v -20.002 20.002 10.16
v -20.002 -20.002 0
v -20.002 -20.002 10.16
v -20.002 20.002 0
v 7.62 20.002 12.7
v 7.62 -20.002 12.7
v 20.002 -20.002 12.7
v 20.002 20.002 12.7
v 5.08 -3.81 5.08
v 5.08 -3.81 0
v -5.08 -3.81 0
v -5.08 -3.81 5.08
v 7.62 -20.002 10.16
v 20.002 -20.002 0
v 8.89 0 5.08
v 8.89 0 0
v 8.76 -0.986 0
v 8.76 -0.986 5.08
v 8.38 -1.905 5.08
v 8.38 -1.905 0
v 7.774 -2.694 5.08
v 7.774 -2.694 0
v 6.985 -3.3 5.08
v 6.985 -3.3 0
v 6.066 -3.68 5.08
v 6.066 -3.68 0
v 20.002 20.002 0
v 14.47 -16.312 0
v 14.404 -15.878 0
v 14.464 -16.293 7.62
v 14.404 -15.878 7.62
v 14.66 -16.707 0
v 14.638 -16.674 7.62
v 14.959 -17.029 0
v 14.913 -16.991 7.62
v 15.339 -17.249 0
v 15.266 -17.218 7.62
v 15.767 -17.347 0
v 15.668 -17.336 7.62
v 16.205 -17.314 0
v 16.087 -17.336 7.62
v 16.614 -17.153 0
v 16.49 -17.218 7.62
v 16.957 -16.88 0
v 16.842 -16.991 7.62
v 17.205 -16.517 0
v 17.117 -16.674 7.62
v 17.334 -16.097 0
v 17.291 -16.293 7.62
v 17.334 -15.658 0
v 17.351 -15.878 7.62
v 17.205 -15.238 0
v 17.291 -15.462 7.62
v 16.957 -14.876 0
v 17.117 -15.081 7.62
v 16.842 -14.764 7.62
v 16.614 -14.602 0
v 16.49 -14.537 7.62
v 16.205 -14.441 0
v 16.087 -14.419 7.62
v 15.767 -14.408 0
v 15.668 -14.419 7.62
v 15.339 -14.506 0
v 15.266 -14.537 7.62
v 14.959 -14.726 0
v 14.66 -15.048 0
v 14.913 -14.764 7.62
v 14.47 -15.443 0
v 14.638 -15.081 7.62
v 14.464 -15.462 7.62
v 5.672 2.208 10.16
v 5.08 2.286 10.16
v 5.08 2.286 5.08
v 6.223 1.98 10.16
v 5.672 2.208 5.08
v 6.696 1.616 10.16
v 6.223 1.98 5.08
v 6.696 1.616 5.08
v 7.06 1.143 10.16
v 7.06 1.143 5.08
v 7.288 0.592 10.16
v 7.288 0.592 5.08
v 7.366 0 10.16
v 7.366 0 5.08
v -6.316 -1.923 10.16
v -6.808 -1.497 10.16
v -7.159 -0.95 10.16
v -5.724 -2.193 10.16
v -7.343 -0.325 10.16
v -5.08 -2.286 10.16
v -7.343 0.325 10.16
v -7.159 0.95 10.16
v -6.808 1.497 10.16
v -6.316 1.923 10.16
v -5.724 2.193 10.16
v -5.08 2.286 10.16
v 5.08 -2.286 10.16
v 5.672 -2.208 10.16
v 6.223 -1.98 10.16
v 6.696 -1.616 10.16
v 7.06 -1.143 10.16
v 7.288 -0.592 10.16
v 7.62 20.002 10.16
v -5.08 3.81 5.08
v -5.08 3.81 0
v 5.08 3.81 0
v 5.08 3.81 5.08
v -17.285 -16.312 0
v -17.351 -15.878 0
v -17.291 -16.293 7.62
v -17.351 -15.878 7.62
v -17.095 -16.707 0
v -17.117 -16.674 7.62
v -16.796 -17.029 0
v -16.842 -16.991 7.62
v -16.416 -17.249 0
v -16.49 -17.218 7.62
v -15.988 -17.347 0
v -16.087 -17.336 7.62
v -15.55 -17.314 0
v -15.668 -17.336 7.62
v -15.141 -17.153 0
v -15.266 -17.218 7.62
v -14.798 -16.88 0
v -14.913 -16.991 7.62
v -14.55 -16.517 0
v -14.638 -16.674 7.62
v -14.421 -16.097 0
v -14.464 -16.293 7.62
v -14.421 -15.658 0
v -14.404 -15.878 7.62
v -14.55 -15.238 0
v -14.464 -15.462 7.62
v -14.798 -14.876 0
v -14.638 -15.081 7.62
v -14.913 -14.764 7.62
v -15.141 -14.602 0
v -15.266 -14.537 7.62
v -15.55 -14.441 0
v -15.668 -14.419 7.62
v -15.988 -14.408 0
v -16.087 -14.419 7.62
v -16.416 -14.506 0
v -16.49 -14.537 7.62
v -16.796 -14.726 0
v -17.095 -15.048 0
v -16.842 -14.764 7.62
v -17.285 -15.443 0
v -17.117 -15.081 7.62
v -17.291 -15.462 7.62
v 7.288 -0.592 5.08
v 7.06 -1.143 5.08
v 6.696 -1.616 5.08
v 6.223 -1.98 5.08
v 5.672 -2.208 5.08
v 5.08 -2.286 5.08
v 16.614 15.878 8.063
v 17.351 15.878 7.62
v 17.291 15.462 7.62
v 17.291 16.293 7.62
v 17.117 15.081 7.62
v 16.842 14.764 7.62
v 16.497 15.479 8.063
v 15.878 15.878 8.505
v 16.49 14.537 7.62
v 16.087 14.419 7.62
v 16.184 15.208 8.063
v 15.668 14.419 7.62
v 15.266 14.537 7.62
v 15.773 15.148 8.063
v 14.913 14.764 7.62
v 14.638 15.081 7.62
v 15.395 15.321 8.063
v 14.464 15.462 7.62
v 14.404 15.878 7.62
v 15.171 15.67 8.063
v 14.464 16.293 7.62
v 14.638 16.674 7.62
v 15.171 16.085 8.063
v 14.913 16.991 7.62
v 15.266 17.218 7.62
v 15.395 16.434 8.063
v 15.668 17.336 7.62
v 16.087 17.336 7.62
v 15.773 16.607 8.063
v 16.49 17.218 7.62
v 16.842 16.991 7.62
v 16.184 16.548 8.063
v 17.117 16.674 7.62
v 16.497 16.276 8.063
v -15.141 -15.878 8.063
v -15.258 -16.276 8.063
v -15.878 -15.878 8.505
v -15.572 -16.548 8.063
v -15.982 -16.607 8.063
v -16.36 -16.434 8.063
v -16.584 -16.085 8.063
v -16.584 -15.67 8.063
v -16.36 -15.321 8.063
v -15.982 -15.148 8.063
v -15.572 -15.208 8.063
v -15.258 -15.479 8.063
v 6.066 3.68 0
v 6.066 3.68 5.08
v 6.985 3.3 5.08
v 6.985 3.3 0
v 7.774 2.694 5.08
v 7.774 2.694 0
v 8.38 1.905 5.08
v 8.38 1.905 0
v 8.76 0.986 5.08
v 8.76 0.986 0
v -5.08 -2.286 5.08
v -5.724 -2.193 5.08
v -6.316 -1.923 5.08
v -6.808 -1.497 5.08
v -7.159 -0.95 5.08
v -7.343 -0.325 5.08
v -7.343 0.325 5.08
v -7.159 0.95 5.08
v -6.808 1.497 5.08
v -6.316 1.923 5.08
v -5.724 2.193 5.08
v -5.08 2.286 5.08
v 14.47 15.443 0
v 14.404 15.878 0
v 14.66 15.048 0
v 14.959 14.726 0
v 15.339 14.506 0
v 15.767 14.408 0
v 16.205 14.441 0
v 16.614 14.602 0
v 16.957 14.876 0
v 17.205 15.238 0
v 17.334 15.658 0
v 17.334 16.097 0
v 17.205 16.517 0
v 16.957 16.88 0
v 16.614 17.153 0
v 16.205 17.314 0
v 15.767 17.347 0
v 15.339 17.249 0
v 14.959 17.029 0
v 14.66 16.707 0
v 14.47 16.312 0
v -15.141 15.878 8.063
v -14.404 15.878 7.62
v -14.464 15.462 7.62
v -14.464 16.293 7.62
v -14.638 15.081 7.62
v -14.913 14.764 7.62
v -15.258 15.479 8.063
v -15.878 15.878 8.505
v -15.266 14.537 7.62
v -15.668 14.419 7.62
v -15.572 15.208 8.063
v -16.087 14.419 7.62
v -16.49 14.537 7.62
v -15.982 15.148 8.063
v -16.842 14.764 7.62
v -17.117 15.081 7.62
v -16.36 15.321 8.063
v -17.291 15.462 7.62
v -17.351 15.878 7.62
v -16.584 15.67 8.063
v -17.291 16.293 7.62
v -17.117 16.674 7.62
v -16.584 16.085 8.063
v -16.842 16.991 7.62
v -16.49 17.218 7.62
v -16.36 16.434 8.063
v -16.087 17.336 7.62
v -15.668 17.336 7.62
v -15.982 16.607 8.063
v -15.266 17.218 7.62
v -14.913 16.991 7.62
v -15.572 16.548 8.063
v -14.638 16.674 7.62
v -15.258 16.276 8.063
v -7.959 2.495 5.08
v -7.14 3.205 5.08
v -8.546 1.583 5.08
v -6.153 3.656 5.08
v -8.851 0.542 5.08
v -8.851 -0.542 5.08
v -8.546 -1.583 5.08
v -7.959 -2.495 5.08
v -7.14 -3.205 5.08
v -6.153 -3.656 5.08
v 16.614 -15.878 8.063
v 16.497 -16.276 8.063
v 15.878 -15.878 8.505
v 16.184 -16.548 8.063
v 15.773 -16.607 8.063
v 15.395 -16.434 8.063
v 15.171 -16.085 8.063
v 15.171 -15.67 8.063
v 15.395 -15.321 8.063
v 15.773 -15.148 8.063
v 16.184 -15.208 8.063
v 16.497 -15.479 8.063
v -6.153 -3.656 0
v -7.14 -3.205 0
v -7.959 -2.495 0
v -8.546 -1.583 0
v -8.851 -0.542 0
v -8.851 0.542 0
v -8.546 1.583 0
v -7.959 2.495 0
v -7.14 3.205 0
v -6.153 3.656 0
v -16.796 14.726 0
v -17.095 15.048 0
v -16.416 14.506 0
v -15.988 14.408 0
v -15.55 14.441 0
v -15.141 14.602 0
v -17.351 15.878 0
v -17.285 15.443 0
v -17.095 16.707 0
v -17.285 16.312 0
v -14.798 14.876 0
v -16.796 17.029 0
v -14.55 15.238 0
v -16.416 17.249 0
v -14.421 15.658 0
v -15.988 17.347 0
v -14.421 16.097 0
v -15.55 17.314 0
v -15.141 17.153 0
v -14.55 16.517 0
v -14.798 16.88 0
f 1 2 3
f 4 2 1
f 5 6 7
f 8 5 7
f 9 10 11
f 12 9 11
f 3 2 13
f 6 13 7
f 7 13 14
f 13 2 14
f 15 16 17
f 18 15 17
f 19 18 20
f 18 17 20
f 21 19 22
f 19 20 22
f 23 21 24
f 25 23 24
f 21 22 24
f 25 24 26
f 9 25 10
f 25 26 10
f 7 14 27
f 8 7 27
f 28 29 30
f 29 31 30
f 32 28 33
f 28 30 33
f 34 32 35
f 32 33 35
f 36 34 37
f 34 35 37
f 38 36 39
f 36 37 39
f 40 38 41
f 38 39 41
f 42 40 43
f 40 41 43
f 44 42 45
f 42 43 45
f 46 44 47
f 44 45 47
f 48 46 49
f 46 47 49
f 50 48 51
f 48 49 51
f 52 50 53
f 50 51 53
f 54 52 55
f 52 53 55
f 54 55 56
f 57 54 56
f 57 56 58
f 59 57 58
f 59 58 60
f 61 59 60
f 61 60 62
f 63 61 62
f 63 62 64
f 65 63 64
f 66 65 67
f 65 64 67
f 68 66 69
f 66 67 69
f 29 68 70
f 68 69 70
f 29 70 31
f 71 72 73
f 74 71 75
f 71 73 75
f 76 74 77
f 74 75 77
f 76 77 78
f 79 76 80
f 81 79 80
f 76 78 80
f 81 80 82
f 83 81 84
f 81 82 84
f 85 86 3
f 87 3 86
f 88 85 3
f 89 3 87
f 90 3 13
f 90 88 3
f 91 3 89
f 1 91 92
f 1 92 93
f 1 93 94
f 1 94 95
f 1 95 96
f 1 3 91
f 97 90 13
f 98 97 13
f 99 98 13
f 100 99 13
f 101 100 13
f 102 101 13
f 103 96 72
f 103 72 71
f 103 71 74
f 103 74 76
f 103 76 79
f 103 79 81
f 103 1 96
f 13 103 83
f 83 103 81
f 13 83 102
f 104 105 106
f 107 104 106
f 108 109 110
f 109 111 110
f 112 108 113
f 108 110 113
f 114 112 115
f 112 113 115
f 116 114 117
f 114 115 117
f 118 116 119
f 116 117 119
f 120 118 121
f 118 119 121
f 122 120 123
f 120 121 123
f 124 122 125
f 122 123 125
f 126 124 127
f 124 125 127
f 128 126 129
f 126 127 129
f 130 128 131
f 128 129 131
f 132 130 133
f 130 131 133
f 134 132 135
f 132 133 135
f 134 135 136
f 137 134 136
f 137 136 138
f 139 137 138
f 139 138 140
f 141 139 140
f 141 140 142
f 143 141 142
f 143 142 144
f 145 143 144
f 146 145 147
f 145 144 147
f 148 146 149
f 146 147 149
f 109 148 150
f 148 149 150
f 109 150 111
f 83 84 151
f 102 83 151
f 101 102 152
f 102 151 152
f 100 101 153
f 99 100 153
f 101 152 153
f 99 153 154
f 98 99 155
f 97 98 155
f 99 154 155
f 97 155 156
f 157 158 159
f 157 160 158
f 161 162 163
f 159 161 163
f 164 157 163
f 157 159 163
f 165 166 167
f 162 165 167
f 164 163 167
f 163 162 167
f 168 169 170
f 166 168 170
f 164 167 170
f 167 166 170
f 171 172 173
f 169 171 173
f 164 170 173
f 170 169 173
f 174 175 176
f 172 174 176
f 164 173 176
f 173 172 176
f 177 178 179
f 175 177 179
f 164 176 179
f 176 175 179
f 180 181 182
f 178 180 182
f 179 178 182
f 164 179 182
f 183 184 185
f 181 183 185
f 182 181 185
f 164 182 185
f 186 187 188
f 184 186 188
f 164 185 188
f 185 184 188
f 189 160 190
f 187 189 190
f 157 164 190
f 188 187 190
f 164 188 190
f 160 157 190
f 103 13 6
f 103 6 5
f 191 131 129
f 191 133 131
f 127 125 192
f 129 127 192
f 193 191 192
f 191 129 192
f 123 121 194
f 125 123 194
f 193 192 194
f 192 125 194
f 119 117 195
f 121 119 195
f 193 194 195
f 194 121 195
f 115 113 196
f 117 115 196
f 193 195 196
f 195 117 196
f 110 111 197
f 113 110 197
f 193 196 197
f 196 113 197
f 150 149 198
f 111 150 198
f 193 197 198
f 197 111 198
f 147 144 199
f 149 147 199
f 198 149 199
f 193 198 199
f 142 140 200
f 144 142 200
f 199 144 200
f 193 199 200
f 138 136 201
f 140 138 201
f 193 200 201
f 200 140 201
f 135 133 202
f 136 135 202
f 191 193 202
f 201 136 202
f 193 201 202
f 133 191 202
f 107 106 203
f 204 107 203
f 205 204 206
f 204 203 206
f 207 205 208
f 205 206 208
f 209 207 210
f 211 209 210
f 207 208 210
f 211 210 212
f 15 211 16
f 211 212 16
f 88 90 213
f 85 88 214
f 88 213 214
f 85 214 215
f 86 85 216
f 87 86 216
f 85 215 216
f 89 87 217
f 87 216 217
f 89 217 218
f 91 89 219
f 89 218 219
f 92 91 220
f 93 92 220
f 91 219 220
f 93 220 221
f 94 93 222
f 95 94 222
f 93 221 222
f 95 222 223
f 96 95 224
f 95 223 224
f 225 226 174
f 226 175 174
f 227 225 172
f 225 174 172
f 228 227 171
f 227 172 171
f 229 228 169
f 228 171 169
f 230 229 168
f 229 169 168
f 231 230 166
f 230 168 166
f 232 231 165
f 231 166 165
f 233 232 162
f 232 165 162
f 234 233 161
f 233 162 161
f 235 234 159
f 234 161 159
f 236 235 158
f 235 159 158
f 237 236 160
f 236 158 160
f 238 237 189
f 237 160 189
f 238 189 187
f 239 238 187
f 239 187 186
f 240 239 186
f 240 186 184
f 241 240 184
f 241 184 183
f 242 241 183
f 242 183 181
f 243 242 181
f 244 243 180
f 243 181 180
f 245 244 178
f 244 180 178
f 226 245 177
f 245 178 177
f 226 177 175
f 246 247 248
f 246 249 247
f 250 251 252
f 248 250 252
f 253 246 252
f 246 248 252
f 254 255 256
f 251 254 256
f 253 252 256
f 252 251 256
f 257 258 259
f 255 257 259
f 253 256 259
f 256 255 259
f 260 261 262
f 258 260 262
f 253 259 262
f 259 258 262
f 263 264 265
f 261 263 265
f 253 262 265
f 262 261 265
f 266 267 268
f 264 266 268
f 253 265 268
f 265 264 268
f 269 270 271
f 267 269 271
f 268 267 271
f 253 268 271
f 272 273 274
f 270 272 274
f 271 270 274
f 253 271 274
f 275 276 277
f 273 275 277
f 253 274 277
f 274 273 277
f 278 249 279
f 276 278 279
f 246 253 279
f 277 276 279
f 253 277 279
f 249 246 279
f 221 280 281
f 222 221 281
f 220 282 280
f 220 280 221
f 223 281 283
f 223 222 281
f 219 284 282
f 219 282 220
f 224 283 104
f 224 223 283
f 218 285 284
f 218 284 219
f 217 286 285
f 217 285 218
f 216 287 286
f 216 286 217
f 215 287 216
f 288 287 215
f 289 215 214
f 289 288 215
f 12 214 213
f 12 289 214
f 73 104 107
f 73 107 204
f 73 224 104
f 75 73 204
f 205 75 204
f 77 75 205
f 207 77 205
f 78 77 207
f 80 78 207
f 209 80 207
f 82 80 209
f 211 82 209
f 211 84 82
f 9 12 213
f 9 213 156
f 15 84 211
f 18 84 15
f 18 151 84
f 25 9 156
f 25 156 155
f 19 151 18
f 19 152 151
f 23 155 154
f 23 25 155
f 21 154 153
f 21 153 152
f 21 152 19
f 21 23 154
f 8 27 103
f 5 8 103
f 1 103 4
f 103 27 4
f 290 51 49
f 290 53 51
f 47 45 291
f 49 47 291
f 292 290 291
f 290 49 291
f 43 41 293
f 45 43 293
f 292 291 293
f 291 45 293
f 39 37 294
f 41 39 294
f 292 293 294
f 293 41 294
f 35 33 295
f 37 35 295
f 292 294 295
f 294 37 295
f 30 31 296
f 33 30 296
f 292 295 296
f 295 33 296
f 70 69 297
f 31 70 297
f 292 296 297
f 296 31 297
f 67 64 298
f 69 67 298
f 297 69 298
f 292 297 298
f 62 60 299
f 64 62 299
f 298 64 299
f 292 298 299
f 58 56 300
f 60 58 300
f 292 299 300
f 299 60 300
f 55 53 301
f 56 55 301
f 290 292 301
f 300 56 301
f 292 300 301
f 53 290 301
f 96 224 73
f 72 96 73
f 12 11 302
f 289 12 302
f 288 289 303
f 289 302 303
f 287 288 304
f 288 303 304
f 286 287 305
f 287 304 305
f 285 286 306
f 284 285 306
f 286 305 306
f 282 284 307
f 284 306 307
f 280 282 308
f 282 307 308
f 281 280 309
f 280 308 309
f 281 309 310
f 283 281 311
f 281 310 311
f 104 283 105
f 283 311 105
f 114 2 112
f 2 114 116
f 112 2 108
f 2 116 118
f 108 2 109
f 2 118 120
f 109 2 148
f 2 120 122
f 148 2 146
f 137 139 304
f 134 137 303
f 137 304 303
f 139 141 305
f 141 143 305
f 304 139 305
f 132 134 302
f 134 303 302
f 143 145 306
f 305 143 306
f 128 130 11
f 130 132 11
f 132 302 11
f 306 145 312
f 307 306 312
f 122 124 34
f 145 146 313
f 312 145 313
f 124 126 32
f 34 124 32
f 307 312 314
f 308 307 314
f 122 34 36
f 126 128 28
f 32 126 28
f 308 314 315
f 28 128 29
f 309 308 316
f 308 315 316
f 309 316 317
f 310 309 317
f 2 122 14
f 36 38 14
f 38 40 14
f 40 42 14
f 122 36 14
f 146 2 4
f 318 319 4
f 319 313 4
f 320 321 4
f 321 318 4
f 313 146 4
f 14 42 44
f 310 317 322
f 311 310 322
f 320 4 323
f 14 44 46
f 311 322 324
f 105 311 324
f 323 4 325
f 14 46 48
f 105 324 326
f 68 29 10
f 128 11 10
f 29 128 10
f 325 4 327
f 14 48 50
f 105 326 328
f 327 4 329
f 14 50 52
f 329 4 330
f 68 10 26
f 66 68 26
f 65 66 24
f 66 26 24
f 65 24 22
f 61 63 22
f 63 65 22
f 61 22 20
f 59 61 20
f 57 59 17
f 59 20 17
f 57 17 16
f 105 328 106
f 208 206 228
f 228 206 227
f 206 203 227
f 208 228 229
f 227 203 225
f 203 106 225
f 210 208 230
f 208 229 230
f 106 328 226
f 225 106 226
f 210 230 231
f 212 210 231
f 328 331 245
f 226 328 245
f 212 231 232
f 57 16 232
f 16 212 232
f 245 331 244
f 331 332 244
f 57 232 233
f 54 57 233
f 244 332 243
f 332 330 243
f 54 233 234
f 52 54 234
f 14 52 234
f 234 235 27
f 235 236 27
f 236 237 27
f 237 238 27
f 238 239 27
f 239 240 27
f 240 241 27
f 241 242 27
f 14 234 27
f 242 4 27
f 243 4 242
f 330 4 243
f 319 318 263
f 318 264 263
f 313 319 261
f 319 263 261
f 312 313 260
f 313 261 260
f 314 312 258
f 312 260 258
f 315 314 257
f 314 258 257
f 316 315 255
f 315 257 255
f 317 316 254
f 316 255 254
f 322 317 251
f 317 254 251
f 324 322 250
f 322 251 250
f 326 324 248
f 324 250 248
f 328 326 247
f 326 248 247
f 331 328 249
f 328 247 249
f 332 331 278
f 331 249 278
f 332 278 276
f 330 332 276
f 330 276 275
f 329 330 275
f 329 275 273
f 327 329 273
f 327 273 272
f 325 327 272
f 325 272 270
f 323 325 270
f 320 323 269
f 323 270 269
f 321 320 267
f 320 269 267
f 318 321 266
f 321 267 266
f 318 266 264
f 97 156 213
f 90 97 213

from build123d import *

# Parameters (mm, degrees)
F0_W     = 27.6225
F0_H     = 40.005
F0_R     = 3.302
F0_W_2   = 12.3825
F0_R_2   = 2.159
F1_DEPTH = 10.16
F2_DEPTH = 12.7
F4_DEPTH = 25.4
F5_DEPTH = 5.08
F6_DEPTH = 12.7
F8_D     = 2.9464
F8_DEPTH = 7.62
F8_TIP   = 0.885187864


# Not quite as in the source:
# - a feature names something its author has since deleted; it is built from what else it names


with BuildPart() as f1:
    # F0 (on Top) → F1 (new body)
    with BuildSketch(Plane.XY):
        with Locations((-6.19125, 0)):
            Rectangle(F0_W, F0_H)
        with Locations((-15.875, -15.875)):
            Circle(F0_R, mode=Mode.SUBTRACT)
        with Locations((-15.875, 15.875)):
            Circle(F0_R, mode=Mode.SUBTRACT)
        with Locations((13.81125, 0)):
            Rectangle(F0_W_2, F0_H)
        with Locations((15.875, -15.875)):
            Circle(F0_R, mode=Mode.SUBTRACT)
        with Locations((15.875, 15.875)):
            Circle(F0_R, mode=Mode.SUBTRACT)
        with Locations((-15.875, 15.875)):
            Circle(F0_R)
        with Locations((-15.875, 15.875)):
            Circle(F0_R_2, mode=Mode.SUBTRACT)
        with Locations((15.875, 15.875)):
            Circle(F0_R)
        with Locations((15.875, 15.875)):
            Circle(F0_R_2, mode=Mode.SUBTRACT)
        with Locations((15.875, -15.875)):
            Circle(F0_R)
        with Locations((15.875, -15.875)):
            Circle(F0_R_2, mode=Mode.SUBTRACT)
        with Locations((-15.875, -15.875)):
            Circle(F0_R)
        with Locations((-15.875, -15.875)):
            Circle(F0_R_2, mode=Mode.SUBTRACT)
        with Locations((-15.875, 15.875)):
            Circle(F0_R_2)
        with Locations((15.875, 15.875)):
            Circle(F0_R_2)
        with Locations((15.875, -15.875)):
            Circle(F0_R_2)
        with Locations((-15.875, -15.875)):
            Circle(F0_R_2)
    extrude(amount=F1_DEPTH)

    # F0 (on Top) → F2 (join)
    with BuildSketch(Plane.XY):
        with Locations((13.81125, 0)):
            Rectangle(F0_W_2, F0_H)
        with Locations((15.875, -15.875)):
            Circle(F0_R, mode=Mode.SUBTRACT)
        with Locations((15.875, 15.875)):
            Circle(F0_R, mode=Mode.SUBTRACT)
    extrude(amount=F2_DEPTH)

    # F3 (on face) → F4 (cut)
    with BuildSketch(Plane(origin=(0, 0, 0), x_dir=(1, 0, 0), z_dir=(0, 0, -1))):
        with BuildLine():
            ThreePointArc((-2.794, 0), (-3.4635538982, 1.6164461018), (-5.08, 2.286))
            ThreePointArc((-5.08, 2.286), (-7.366, 0), (-5.08, -2.286))
            ThreePointArc((-5.08, -2.286), (-3.4635538982, -1.6164461018), (-2.794, 0))
        make_face()
        with BuildLine():
            ThreePointArc((7.366, 0), (6.6964461018, 1.6164461018), (5.08, 2.286))
            ThreePointArc((5.08, 2.286), (2.794, 0), (5.08, -2.286))
            ThreePointArc((5.08, -2.286), (6.6964461018, -1.6164461018), (7.366, 0))
        make_face()
        with BuildLine():
            ThreePointArc((-1.27, 0), (-1.4655166344, 1.2048277885), (-2.032, 2.286))
            Line((-2.032, 2.286), (-5.08, 2.286))
            ThreePointArc((-5.08, 2.286), (-3.4635538982, 1.6164461018), (-2.794, 0))
            ThreePointArc((-2.794, 0), (-3.4635538982, -1.6164461018), (-5.08, -2.286))
            Line((-5.08, -2.286), (-2.032, -2.286))
            ThreePointArc((-2.032, -2.286), (-1.4655166344, -1.2048277885), (-1.27, 0))
        make_face()
        with BuildLine():
            ThreePointArc((2.032, -2.286), (1.27, 0), (2.032, 2.286))
            Line((2.032, 2.286), (-2.032, 2.286))
            ThreePointArc((-2.032, 2.286), (-1.4655166344, 1.2048277885), (-1.27, 0))
            ThreePointArc((-1.27, 0), (-1.4655166344, -1.2048277885), (-2.032, -2.286))
            Line((-2.032, -2.286), (2.032, -2.286))
        make_face()
        with BuildLine():
            Line((5.08, 2.286), (2.032, 2.286))
            ThreePointArc((2.032, 2.286), (1.27, 0), (2.032, -2.286))
            Line((2.032, -2.286), (5.08, -2.286))
            ThreePointArc((5.08, -2.286), (2.794, 0), (5.08, 2.286))
        make_face()
    extrude(amount=-F4_DEPTH, mode=Mode.SUBTRACT)

    # F3 (on face) → F5 (cut)
    with BuildSketch(Plane(origin=(0, 0, 0), x_dir=(1, 0, 0), z_dir=(0, 0, -1))):
        with BuildLine():
            ThreePointArc((-1.27, 0), (-1.4655166344, 1.2048277885), (-2.032, 2.286))
            Line((-2.032, 2.286), (-5.08, 2.286))
            ThreePointArc((-5.08, 2.286), (-3.4635538982, 1.6164461018), (-2.794, 0))
            ThreePointArc((-2.794, 0), (-3.4635538982, -1.6164461018), (-5.08, -2.286))
            Line((-5.08, -2.286), (-2.032, -2.286))
            ThreePointArc((-2.032, -2.286), (-1.4655166344, -1.2048277885), (-1.27, 0))
        make_face()
        with BuildLine():
            ThreePointArc((-2.032, 2.286), (-3.3761162011, 3.4077675977), (-5.08, 3.81))
            ThreePointArc((-5.08, 3.81), (-8.89, 0), (-5.08, -3.81))
            ThreePointArc((-5.08, -3.81), (-3.3761162011, -3.4077675977), (-2.032, -2.286))
            Line((-2.032, -2.286), (-5.08, -2.286))
            ThreePointArc((-5.08, -2.286), (-7.366, 0), (-5.08, 2.286))
            Line((-5.08, 2.286), (-2.032, 2.286))
        make_face()
        with BuildLine():
            ThreePointArc((2.032, 2.286), (3.3761162011, 3.4077675977), (5.08, 3.81))
            Line((5.08, 3.81), (-5.08, 3.81))
            ThreePointArc((-5.08, 3.81), (-3.3761162011, 3.4077675977), (-2.032, 2.286))
            Line((-2.032, 2.286), (2.032, 2.286))
        make_face()
        with BuildLine():
            ThreePointArc((2.032, -2.286), (1.27, 0), (2.032, 2.286))
            Line((2.032, 2.286), (-2.032, 2.286))
            ThreePointArc((-2.032, 2.286), (-1.4655166344, 1.2048277885), (-1.27, 0))
            ThreePointArc((-1.27, 0), (-1.4655166344, -1.2048277885), (-2.032, -2.286))
            Line((-2.032, -2.286), (2.032, -2.286))
        make_face()
        with BuildLine():
            Line((5.08, 2.286), (2.032, 2.286))
            ThreePointArc((2.032, 2.286), (1.27, 0), (2.032, -2.286))
            Line((2.032, -2.286), (5.08, -2.286))
            ThreePointArc((5.08, -2.286), (2.794, 0), (5.08, 2.286))
        make_face()
        with BuildLine():
            ThreePointArc((5.08, -3.81), (7.7740768363, -2.6940768363), (8.89, 0))
            ThreePointArc((8.89, 0), (7.7740768363, 2.6940768363), (5.08, 3.81))
            ThreePointArc((5.08, 3.81), (3.3761162011, 3.4077675977), (2.032, 2.286))
            Line((2.032, 2.286), (5.08, 2.286))
            ThreePointArc((5.08, 2.286), (6.6964461018, 1.6164461018), (7.366, 0))
            ThreePointArc((7.366, 0), (6.6964461018, -1.6164461018), (5.08, -2.286))
            Line((5.08, -2.286), (2.032, -2.286))
            ThreePointArc((2.032, -2.286), (3.3761162011, -3.4077675977), (5.08, -3.81))
        make_face()
        with BuildLine():
            Line((-5.08, -3.81), (5.08, -3.81))
            ThreePointArc((5.08, -3.81), (3.3761162011, -3.4077675977), (2.032, -2.286))
            Line((2.032, -2.286), (-2.032, -2.286))
            ThreePointArc((-2.032, -2.286), (-3.3761162011, -3.4077675977), (-5.08, -3.81))
        make_face()
    extrude(amount=-F5_DEPTH, mode=Mode.SUBTRACT)

    # F0 (on Top) → F6 (join)
    with BuildSketch(Plane.XY):
        with Locations((15.875, 15.875)):
            Circle(F0_R)
        with Locations((15.875, 15.875)):
            Circle(F0_R_2, mode=Mode.SUBTRACT)
        with Locations((15.875, 15.875)):
            Circle(F0_R_2)
        with Locations((15.875, -15.875)):
            Circle(F0_R)
        with Locations((15.875, -15.875)):
            Circle(F0_R_2, mode=Mode.SUBTRACT)
        with Locations((15.875, -15.875)):
            Circle(F0_R_2)
    extrude(amount=F6_DEPTH)

    # F8
    with Locations(Plane(origin=(0, 0, 0), x_dir=(1, 0, 0), z_dir=(0, 0, -1))):
        with Locations((-15.87754, 15.87754), (15.87754, 15.87754), (15.87754, -15.87754), (-15.87754, -15.87754)):
            Hole(F8_D / 2, depth=F8_DEPTH)
            with Locations((0, 0, -(F8_DEPTH + F8_TIP / 2))):  # 118° drill point
                Cone(0, F8_D / 2, F8_TIP, mode=Mode.SUBTRACT)


solid = f1.part
